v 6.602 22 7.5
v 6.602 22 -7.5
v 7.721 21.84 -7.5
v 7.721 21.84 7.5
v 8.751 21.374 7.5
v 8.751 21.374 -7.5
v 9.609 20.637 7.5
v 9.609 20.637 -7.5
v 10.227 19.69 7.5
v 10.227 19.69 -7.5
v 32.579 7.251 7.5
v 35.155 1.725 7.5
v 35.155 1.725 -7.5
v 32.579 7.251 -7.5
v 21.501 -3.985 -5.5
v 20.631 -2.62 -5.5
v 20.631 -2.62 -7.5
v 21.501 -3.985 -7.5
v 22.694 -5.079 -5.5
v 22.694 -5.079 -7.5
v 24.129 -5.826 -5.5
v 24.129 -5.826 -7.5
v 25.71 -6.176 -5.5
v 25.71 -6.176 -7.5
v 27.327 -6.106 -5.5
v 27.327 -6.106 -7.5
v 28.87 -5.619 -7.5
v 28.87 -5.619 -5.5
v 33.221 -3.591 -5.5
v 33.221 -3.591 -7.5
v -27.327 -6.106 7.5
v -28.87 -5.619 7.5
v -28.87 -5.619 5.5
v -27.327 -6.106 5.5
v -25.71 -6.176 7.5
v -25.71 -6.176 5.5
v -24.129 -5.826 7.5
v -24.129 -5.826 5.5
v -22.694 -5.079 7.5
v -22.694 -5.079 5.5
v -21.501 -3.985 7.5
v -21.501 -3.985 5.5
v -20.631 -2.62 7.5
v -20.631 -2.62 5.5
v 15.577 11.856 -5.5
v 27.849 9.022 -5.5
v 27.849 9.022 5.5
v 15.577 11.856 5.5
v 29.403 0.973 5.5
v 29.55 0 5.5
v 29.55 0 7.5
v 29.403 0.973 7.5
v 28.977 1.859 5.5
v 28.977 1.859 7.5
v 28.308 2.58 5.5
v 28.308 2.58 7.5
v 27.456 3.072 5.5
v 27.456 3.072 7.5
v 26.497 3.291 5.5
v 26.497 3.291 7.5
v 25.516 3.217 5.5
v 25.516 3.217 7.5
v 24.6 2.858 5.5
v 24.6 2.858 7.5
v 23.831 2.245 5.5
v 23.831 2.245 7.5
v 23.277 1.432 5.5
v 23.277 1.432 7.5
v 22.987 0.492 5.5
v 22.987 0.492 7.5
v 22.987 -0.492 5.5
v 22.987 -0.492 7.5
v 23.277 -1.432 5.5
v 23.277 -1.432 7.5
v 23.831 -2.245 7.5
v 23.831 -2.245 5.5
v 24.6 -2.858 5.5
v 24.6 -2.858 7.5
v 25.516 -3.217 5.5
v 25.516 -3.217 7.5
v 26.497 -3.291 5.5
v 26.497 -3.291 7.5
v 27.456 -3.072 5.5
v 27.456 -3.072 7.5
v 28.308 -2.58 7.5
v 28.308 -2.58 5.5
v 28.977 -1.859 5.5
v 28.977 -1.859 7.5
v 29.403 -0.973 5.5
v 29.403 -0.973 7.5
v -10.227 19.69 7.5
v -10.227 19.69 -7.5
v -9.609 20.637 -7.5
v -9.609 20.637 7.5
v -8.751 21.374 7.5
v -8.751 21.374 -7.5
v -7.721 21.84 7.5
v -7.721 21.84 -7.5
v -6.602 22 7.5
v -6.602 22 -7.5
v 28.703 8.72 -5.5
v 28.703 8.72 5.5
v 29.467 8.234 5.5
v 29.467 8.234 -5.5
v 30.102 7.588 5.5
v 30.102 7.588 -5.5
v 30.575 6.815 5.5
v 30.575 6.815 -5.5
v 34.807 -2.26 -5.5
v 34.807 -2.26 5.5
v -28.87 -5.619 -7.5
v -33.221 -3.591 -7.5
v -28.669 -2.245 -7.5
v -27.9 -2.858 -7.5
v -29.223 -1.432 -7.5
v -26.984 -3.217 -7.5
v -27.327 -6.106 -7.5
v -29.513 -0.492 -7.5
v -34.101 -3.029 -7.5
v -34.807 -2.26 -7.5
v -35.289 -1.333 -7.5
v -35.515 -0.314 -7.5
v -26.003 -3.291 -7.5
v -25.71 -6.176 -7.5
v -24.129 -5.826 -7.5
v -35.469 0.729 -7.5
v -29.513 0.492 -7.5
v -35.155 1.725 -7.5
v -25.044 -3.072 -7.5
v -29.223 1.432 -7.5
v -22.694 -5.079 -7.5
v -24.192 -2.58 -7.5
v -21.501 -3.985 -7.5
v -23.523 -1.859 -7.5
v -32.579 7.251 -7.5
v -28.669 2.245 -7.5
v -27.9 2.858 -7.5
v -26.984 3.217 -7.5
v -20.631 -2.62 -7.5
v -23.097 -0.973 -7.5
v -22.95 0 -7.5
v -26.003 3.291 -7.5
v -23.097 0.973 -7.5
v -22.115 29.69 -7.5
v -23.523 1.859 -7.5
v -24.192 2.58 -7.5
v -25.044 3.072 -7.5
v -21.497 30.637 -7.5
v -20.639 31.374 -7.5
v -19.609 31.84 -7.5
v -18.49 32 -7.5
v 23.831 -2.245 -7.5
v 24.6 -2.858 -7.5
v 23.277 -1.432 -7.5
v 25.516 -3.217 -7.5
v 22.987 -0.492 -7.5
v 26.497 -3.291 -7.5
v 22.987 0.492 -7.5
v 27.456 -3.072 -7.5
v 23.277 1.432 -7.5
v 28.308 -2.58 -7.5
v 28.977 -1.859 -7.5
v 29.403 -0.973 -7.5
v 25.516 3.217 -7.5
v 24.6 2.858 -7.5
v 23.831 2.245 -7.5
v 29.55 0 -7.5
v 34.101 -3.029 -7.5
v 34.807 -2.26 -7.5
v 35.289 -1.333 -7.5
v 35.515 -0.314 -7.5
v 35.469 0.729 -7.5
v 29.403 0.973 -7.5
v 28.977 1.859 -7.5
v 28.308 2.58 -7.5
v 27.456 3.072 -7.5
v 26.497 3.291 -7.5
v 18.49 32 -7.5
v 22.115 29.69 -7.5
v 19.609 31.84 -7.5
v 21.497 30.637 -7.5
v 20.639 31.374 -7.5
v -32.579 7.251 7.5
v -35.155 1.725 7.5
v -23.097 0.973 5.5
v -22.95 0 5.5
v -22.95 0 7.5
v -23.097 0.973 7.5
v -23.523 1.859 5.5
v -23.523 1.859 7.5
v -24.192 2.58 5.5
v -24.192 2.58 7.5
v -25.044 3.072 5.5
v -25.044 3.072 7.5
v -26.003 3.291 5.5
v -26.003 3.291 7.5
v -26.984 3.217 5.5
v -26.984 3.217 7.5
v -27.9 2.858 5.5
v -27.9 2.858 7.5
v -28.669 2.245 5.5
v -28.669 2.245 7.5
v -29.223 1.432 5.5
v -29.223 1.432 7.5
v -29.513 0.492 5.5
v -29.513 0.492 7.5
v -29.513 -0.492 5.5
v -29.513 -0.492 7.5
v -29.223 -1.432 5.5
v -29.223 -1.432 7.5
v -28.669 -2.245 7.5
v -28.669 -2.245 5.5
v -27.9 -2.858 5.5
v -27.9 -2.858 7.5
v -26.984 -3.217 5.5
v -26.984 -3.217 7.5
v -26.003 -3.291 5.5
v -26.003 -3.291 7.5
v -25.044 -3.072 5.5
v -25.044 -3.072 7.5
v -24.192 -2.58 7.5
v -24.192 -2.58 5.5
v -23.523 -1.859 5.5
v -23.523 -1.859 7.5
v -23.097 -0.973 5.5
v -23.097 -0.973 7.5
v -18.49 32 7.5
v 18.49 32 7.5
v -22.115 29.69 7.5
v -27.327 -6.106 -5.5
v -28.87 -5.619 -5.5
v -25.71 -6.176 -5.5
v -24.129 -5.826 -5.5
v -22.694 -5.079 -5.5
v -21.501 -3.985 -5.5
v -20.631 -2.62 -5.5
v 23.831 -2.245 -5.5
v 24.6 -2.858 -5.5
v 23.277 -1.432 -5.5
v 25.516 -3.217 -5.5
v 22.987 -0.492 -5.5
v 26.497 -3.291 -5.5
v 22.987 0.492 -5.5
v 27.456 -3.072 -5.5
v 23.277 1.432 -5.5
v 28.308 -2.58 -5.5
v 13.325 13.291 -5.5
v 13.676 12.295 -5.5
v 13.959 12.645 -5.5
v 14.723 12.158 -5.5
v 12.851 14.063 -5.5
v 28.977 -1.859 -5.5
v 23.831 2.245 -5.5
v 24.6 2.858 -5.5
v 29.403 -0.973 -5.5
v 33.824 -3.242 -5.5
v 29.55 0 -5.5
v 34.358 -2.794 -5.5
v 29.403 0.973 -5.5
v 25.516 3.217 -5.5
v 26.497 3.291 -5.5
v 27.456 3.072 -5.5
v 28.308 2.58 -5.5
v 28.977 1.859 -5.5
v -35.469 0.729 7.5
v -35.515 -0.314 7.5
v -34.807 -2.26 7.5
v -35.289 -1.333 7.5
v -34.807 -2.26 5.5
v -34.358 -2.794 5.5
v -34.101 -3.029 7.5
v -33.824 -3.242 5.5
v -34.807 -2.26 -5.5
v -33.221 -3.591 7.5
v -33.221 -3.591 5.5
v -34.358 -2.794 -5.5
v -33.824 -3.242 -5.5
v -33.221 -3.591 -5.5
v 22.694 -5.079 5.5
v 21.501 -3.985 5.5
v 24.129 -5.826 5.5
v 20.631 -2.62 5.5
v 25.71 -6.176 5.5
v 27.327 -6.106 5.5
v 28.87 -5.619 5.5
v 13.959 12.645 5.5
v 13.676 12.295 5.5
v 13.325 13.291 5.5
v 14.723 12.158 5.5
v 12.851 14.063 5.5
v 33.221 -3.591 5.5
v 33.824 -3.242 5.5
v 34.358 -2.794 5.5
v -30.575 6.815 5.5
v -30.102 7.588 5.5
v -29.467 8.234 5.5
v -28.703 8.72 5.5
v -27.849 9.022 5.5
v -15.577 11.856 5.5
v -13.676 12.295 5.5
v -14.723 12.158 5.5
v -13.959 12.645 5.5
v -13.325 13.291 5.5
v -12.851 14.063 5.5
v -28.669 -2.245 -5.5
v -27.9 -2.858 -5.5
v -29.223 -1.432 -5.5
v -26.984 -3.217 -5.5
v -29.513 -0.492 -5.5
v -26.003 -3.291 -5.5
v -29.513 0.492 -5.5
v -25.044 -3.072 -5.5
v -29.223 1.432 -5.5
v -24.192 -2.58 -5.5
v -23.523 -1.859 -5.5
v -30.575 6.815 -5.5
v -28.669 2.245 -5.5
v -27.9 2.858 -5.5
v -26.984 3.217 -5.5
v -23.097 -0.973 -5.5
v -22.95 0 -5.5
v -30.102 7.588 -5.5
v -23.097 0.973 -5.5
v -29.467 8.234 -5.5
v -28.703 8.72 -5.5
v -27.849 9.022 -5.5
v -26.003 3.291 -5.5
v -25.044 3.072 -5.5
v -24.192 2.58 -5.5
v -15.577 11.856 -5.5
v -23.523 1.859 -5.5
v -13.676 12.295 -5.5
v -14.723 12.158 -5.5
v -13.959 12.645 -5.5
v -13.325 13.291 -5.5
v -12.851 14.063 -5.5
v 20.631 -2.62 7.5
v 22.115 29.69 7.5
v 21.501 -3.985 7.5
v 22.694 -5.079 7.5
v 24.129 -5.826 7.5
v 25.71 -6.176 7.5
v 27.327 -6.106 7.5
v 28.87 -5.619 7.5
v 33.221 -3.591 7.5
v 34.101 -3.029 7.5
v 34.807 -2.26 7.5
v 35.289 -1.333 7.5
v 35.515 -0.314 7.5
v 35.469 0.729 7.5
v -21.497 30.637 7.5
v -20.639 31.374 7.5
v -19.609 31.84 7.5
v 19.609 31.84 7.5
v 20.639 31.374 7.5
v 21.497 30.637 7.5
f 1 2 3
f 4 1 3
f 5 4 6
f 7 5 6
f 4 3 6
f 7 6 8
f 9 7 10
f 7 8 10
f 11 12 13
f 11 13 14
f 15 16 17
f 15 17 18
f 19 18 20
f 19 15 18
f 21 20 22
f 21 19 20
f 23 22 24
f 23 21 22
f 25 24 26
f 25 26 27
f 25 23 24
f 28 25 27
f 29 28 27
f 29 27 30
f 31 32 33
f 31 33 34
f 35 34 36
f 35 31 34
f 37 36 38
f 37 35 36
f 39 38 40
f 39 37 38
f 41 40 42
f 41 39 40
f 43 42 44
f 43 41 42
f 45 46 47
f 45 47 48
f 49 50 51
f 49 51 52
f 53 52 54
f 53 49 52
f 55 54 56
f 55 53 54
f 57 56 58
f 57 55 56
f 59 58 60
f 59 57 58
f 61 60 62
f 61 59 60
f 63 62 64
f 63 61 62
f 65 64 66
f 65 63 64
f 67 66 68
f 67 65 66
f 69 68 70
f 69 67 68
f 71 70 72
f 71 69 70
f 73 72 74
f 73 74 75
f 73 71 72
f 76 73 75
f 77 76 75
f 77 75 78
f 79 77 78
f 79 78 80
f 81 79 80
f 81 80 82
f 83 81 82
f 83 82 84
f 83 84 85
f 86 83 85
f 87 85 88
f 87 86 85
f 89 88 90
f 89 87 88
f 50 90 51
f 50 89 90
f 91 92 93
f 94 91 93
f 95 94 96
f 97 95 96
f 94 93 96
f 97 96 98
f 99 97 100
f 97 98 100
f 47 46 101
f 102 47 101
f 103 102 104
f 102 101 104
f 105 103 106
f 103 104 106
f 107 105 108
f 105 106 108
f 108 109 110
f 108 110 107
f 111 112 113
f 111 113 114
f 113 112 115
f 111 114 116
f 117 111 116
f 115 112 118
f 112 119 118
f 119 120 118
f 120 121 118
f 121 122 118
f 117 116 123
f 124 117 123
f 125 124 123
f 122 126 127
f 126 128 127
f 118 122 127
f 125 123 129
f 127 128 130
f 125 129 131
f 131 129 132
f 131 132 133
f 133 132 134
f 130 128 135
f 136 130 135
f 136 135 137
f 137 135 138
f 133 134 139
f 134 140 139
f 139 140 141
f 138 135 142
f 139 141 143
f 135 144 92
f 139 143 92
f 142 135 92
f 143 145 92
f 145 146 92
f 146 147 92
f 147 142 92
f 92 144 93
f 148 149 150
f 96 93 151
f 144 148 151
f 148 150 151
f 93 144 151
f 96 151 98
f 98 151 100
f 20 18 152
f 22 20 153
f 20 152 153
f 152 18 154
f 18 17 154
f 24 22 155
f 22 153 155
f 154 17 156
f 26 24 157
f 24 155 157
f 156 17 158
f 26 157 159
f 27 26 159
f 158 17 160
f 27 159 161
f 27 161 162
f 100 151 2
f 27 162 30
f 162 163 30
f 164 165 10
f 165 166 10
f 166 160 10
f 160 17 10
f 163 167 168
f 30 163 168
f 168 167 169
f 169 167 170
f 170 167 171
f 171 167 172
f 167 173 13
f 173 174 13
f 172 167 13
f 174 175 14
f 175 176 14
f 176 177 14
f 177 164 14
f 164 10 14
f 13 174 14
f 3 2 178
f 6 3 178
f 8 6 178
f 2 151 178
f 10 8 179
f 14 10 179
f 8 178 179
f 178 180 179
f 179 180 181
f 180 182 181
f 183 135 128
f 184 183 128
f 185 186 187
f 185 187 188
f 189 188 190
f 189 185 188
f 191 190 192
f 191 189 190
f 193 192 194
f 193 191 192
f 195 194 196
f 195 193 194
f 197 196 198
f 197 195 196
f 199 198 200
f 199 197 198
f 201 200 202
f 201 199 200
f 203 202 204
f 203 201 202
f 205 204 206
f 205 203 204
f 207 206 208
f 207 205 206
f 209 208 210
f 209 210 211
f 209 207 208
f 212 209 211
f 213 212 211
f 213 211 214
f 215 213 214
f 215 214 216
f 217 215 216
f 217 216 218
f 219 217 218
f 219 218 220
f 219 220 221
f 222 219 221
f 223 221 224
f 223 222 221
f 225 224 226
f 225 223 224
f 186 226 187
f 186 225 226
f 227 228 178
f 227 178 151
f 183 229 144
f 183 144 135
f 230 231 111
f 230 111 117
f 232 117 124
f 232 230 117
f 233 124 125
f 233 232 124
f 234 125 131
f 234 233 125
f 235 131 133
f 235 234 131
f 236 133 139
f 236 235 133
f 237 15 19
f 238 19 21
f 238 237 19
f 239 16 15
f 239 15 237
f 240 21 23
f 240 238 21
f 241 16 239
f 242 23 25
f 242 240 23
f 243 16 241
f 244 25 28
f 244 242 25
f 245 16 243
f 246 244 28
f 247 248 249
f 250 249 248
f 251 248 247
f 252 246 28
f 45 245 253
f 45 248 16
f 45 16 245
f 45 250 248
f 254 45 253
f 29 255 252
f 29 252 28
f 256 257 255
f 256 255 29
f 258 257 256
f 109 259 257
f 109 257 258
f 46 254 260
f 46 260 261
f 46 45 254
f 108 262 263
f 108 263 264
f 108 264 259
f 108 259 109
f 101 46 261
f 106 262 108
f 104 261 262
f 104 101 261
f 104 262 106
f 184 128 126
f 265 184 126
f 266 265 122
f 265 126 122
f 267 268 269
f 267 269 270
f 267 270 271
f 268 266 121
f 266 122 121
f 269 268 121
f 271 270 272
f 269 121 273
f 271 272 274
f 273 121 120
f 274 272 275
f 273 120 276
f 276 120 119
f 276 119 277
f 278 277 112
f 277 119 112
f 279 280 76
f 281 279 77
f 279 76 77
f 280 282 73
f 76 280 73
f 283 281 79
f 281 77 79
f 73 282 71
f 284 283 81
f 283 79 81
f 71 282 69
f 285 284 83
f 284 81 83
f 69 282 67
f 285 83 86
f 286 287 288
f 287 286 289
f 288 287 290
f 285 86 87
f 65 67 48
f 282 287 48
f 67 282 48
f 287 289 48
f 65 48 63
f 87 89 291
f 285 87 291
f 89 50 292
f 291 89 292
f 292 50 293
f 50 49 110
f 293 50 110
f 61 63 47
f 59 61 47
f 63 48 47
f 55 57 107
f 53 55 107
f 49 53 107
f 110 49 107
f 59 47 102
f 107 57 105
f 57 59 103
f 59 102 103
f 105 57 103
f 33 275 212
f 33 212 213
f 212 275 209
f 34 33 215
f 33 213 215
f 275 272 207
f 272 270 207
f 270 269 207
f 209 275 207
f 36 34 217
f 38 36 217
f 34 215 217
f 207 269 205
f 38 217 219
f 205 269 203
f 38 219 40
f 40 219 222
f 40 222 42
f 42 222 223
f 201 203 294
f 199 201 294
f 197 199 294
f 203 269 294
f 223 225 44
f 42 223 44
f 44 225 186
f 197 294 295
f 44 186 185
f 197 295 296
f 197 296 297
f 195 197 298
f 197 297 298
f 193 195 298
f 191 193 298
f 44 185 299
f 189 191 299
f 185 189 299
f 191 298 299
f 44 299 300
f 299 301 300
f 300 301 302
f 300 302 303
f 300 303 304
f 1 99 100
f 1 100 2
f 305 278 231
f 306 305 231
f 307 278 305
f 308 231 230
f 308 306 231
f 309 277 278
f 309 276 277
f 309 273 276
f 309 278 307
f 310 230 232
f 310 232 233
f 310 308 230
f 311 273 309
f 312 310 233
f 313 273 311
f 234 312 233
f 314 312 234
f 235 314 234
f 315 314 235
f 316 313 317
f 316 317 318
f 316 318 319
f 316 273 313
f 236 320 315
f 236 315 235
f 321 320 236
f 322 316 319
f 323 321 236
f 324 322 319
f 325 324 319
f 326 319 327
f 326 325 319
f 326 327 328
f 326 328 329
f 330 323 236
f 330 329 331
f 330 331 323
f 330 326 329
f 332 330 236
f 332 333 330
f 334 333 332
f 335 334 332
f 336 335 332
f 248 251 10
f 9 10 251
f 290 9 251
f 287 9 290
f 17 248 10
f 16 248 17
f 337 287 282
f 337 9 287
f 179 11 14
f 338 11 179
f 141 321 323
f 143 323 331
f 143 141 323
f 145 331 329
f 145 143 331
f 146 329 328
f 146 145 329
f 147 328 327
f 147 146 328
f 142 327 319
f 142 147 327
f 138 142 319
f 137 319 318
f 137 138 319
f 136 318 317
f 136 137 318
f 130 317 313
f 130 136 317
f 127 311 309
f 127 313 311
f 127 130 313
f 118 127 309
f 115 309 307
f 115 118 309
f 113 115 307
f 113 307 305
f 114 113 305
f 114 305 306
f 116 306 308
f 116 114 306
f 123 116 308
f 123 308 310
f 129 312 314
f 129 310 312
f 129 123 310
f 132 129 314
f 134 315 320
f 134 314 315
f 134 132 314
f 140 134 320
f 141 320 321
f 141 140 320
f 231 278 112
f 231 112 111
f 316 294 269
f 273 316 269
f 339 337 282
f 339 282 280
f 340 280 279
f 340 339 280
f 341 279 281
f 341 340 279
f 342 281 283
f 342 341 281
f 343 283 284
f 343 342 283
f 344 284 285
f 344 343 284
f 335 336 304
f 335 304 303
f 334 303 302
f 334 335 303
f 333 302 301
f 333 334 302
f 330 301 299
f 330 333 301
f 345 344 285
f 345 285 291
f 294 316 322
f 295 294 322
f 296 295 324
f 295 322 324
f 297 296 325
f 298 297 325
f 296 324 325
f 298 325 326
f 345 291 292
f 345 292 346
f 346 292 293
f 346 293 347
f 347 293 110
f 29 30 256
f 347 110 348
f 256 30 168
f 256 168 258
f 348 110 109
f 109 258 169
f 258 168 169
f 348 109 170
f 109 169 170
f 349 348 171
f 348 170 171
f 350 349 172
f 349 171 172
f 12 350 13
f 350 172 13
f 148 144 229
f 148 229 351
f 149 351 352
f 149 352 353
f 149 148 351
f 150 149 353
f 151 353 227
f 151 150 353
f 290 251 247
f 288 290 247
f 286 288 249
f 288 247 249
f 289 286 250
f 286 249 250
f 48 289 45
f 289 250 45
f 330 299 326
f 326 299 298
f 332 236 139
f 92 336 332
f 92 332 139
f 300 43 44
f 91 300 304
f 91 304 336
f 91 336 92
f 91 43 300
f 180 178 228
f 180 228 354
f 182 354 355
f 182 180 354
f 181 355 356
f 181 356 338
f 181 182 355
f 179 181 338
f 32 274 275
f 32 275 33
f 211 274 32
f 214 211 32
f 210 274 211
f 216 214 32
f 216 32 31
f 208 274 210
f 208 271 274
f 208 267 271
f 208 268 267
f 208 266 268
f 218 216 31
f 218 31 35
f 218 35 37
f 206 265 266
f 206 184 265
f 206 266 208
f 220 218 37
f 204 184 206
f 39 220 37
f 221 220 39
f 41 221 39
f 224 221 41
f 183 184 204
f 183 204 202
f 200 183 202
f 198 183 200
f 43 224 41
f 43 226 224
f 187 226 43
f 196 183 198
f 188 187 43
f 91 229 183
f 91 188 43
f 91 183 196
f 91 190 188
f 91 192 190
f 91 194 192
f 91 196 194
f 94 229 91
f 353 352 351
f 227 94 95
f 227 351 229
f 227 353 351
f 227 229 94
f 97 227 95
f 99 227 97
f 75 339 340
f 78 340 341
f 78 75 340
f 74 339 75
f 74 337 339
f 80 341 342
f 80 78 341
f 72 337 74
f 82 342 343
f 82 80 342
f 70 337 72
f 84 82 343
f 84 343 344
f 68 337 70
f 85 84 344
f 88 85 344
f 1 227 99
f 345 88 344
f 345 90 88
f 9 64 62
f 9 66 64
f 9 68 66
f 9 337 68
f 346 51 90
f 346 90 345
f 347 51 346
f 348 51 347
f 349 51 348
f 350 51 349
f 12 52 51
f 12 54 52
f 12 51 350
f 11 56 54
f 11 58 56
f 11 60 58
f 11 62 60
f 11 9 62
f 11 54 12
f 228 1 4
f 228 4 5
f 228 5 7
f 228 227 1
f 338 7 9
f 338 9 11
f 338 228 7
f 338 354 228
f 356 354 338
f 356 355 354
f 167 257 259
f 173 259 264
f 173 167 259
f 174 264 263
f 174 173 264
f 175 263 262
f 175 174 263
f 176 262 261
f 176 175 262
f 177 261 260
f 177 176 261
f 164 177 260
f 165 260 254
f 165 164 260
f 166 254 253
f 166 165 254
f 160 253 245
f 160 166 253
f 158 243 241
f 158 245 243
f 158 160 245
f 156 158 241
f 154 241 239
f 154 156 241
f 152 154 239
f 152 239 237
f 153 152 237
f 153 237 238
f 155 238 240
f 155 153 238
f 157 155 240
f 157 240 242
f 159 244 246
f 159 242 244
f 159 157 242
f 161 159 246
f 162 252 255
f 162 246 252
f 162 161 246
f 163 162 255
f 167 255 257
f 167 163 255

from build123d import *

# Parameters (mm, degrees)
F1_R        = 3.3
F2_DEPTH    = 7.5
F0_R        = 3.3
F3_DEPTH    = 7.501
F5_DEPTH    = 5.5
F6_T1_DEPTH = 15
F6_T3_DEPTH = 11
F6_T5_DEPTH = 11
F6_T7_DEPTH = 35
F6_T9_DEPTH = 27.7414052161


# Not quite as in the source:
# - a fillet or chamfer that OpenCascade refuses, or shapes differently, is made with other operations: its cross-section is extruded or revolved along the edge and cut away or added
# - a feature names something its author has since deleted; it is built from what else it names


with BuildPart() as f2:
    # F1 (on Top) → F2 (new body, symmetric)
    with BuildSketch(Plane.XY):
        with BuildLine():
            Line((-9.150288423, 22), (0, 22))
            Line((0, 22), (9.150288423, 22))
            Line((9.150288423, 22), (20.6308917204, -2.6202332228))
            ThreePointArc((20.6308917204, -2.6202332228), (24.1294751114, -5.8260942489), (28.8702332228, -5.6191082796))
            Line((28.8702332228, -5.6191082796), (36.8457417487, -1.9000675763))
            Line((36.8457417487, -1.9000675763), (32.5785159717, 7.2510276339))
            Line((32.5785159717, 7.2510276339), (21.0378806259, 32))
            Line((21.0378806259, 32), (0, 32))
            Line((0, 32), (-21.0378806259, 32))
            Line((-21.0378806259, 32), (-32.5785159717, 7.2510276339))
            Line((-32.5785159717, 7.2510276339), (-36.8457417487, -1.9000675763))
            Line((-36.8457417487, -1.9000675763), (-28.8702332228, -5.6191082796))
            ThreePointArc((-28.8702332228, -5.6191082796), (-24.1294751114, -5.8260942489), (-20.6308917204, -2.6202332228))
            Line((-20.6308917204, -2.6202332228), (-9.150288423, 22))
        make_face()
        with Locations((-26.25, 0)):
            Circle(F1_R, mode=Mode.SUBTRACT)
        with Locations((26.25, 0)):
            Circle(F1_R, mode=Mode.SUBTRACT)
    extrude(amount=F2_DEPTH, both=True)

    # F0 (on Top) → F3 (cut, through all)
    with BuildSketch(Plane.XY):
        with Locations((26.25, 0)):
            Circle(F0_R)
        with Locations((-26.25, 0)):
            Circle(F0_R)
    extrude(amount=F3_DEPTH, mode=Mode.SUBTRACT)

    # F4 (on Top) → F5 (cut, symmetric)
    with BuildSketch(Plane.XY):
        Polygon((38.163918051, -9.4593089454), (29.7503979029, 8.5835432382), (11.4094827275, 12.8178771483), (24.044580395, -14.2781772408), align=None)
        Polygon((-29.7503979029, 8.5835432382), (-38.163918051, -9.4593089454), (-24.044580395, -14.2781772408), (-11.4094827275, 12.8178771483), align=None)
    extrude(amount=F5_DEPTH, both=True, mode=Mode.SUBTRACT)

    # F6: fillet of radius 4 on 10 edges, made by hand

    # F6_s2 → F6_t1 (join)
    with BuildSketch(Plane.XY.offset(-7.5)):
        with BuildLine():
            ThreePointArc((6.6020073798, 22), (8.7512058132, 21.3735657833), (10.2272385279, 19.690473047))
            Line((10.2272385279, 19.690473047), (9.150288423, 22))
            Line((9.150288423, 22), (6.6020073798, 22))
        make_face()
        with BuildLine():
            ThreePointArc((-10.2272385279, 19.690473047), (-8.7512058132, 21.3735657833), (-6.6020073798, 22))
            Line((-6.6020073798, 22), (-9.150288423, 22))
            Line((-9.150288423, 22), (-10.2272385279, 19.690473047))
        make_face()
    extrude(amount=F6_T1_DEPTH)

    # F6_s4 → F6_t3 (join)
    with BuildSketch(Plane.XY.offset(-5.5)):
        with BuildLine():
            ThreePointArc((27.8494697672, 9.0224070783), (29.466947114, 8.233510665), (30.574896698, 6.8153998661))
            Line((30.574896698, 6.8153998661), (29.7503979029, 8.5835432382))
            Line((29.7503979029, 8.5835432382), (27.8494697672, 9.0224070783))
        make_face()
        with BuildLine():
            ThreePointArc((-30.574896698, 6.8153998661), (-29.466947114, 8.233510665), (-27.8494697672, 9.0224070783))
            Line((-27.8494697672, 9.0224070783), (-29.7503979029, 8.5835432382))
            Line((-29.7503979029, 8.5835432382), (-30.574896698, 6.8153998661))
        make_face()
    extrude(amount=F6_T3_DEPTH)

    # F6_s6 → F6_t5 (cut)
    with BuildSketch(Plane.XY.offset(-5.5)):
        with BuildLine():
            ThreePointArc((12.8514854221, 14.0627574212), (13.9594350061, 12.6446466223), (15.5769123529, 11.855750209))
            Line((15.5769123529, 11.855750209), (13.6759842172, 12.2946140492))
            Line((13.6759842172, 12.2946140492), (12.8514854221, 14.0627574212))
        make_face()
        with BuildLine():
            ThreePointArc((-12.8514854221, 14.0627574212), (-13.9594350061, 12.6446466223), (-15.5769123529, 11.855750209))
            Line((-15.5769123529, 11.855750209), (-13.6759842172, 12.2946140492))
            Line((-13.6759842172, 12.2946140492), (-12.8514854221, 14.0627574212))
        make_face()
    extrude(amount=F6_T5_DEPTH, mode=Mode.SUBTRACT)

    # F6_s8 → F6_t7 (cut)
    with BuildSketch(Plane.XY.offset(-17.5)):
        with BuildLine():
            ThreePointArc((33.2205106006, -3.5905406233), (35.2888080367, -1.3333900484), (35.1552687018, 1.7251635718))
            Line((35.1552687018, 1.7251635718), (36.8457417487, -1.9000675763))
            Line((36.8457417487, -1.9000675763), (33.2205106006, -3.5905406233))
        make_face()
        with BuildLine():
            ThreePointArc((-35.1552687018, 1.7251635718), (-35.2888080367, -1.3333900484), (-33.2205106006, -3.5905406233))
            Line((-33.2205106006, -3.5905406233), (-36.8457417487, -1.9000675763))
            Line((-36.8457417487, -1.9000675763), (-35.1552687018, 1.7251635718))
        make_face()
    extrude(amount=F6_T7_DEPTH, mode=Mode.SUBTRACT)

    # F6_s10 → F6_t9 (cut)
    with BuildSketch(Plane.XY.offset(-13.8707026081)):
        with BuildLine():
            ThreePointArc((18.4895995827, 32), (20.6387980161, 31.3735657833), (22.1148307308, 29.690473047))
            Line((22.1148307308, 29.690473047), (21.0378806259, 32))
            Line((21.0378806259, 32), (18.4895995827, 32))
        make_face()
        with BuildLine():
            ThreePointArc((-22.1148307308, 29.690473047), (-20.6387980161, 31.3735657833), (-18.4895995827, 32))
            Line((-18.4895995827, 32), (-21.0378806259, 32))
            Line((-21.0378806259, 32), (-22.1148307308, 29.690473047))
        make_face()
    extrude(amount=F6_T9_DEPTH, mode=Mode.SUBTRACT)


solid = f2.part
